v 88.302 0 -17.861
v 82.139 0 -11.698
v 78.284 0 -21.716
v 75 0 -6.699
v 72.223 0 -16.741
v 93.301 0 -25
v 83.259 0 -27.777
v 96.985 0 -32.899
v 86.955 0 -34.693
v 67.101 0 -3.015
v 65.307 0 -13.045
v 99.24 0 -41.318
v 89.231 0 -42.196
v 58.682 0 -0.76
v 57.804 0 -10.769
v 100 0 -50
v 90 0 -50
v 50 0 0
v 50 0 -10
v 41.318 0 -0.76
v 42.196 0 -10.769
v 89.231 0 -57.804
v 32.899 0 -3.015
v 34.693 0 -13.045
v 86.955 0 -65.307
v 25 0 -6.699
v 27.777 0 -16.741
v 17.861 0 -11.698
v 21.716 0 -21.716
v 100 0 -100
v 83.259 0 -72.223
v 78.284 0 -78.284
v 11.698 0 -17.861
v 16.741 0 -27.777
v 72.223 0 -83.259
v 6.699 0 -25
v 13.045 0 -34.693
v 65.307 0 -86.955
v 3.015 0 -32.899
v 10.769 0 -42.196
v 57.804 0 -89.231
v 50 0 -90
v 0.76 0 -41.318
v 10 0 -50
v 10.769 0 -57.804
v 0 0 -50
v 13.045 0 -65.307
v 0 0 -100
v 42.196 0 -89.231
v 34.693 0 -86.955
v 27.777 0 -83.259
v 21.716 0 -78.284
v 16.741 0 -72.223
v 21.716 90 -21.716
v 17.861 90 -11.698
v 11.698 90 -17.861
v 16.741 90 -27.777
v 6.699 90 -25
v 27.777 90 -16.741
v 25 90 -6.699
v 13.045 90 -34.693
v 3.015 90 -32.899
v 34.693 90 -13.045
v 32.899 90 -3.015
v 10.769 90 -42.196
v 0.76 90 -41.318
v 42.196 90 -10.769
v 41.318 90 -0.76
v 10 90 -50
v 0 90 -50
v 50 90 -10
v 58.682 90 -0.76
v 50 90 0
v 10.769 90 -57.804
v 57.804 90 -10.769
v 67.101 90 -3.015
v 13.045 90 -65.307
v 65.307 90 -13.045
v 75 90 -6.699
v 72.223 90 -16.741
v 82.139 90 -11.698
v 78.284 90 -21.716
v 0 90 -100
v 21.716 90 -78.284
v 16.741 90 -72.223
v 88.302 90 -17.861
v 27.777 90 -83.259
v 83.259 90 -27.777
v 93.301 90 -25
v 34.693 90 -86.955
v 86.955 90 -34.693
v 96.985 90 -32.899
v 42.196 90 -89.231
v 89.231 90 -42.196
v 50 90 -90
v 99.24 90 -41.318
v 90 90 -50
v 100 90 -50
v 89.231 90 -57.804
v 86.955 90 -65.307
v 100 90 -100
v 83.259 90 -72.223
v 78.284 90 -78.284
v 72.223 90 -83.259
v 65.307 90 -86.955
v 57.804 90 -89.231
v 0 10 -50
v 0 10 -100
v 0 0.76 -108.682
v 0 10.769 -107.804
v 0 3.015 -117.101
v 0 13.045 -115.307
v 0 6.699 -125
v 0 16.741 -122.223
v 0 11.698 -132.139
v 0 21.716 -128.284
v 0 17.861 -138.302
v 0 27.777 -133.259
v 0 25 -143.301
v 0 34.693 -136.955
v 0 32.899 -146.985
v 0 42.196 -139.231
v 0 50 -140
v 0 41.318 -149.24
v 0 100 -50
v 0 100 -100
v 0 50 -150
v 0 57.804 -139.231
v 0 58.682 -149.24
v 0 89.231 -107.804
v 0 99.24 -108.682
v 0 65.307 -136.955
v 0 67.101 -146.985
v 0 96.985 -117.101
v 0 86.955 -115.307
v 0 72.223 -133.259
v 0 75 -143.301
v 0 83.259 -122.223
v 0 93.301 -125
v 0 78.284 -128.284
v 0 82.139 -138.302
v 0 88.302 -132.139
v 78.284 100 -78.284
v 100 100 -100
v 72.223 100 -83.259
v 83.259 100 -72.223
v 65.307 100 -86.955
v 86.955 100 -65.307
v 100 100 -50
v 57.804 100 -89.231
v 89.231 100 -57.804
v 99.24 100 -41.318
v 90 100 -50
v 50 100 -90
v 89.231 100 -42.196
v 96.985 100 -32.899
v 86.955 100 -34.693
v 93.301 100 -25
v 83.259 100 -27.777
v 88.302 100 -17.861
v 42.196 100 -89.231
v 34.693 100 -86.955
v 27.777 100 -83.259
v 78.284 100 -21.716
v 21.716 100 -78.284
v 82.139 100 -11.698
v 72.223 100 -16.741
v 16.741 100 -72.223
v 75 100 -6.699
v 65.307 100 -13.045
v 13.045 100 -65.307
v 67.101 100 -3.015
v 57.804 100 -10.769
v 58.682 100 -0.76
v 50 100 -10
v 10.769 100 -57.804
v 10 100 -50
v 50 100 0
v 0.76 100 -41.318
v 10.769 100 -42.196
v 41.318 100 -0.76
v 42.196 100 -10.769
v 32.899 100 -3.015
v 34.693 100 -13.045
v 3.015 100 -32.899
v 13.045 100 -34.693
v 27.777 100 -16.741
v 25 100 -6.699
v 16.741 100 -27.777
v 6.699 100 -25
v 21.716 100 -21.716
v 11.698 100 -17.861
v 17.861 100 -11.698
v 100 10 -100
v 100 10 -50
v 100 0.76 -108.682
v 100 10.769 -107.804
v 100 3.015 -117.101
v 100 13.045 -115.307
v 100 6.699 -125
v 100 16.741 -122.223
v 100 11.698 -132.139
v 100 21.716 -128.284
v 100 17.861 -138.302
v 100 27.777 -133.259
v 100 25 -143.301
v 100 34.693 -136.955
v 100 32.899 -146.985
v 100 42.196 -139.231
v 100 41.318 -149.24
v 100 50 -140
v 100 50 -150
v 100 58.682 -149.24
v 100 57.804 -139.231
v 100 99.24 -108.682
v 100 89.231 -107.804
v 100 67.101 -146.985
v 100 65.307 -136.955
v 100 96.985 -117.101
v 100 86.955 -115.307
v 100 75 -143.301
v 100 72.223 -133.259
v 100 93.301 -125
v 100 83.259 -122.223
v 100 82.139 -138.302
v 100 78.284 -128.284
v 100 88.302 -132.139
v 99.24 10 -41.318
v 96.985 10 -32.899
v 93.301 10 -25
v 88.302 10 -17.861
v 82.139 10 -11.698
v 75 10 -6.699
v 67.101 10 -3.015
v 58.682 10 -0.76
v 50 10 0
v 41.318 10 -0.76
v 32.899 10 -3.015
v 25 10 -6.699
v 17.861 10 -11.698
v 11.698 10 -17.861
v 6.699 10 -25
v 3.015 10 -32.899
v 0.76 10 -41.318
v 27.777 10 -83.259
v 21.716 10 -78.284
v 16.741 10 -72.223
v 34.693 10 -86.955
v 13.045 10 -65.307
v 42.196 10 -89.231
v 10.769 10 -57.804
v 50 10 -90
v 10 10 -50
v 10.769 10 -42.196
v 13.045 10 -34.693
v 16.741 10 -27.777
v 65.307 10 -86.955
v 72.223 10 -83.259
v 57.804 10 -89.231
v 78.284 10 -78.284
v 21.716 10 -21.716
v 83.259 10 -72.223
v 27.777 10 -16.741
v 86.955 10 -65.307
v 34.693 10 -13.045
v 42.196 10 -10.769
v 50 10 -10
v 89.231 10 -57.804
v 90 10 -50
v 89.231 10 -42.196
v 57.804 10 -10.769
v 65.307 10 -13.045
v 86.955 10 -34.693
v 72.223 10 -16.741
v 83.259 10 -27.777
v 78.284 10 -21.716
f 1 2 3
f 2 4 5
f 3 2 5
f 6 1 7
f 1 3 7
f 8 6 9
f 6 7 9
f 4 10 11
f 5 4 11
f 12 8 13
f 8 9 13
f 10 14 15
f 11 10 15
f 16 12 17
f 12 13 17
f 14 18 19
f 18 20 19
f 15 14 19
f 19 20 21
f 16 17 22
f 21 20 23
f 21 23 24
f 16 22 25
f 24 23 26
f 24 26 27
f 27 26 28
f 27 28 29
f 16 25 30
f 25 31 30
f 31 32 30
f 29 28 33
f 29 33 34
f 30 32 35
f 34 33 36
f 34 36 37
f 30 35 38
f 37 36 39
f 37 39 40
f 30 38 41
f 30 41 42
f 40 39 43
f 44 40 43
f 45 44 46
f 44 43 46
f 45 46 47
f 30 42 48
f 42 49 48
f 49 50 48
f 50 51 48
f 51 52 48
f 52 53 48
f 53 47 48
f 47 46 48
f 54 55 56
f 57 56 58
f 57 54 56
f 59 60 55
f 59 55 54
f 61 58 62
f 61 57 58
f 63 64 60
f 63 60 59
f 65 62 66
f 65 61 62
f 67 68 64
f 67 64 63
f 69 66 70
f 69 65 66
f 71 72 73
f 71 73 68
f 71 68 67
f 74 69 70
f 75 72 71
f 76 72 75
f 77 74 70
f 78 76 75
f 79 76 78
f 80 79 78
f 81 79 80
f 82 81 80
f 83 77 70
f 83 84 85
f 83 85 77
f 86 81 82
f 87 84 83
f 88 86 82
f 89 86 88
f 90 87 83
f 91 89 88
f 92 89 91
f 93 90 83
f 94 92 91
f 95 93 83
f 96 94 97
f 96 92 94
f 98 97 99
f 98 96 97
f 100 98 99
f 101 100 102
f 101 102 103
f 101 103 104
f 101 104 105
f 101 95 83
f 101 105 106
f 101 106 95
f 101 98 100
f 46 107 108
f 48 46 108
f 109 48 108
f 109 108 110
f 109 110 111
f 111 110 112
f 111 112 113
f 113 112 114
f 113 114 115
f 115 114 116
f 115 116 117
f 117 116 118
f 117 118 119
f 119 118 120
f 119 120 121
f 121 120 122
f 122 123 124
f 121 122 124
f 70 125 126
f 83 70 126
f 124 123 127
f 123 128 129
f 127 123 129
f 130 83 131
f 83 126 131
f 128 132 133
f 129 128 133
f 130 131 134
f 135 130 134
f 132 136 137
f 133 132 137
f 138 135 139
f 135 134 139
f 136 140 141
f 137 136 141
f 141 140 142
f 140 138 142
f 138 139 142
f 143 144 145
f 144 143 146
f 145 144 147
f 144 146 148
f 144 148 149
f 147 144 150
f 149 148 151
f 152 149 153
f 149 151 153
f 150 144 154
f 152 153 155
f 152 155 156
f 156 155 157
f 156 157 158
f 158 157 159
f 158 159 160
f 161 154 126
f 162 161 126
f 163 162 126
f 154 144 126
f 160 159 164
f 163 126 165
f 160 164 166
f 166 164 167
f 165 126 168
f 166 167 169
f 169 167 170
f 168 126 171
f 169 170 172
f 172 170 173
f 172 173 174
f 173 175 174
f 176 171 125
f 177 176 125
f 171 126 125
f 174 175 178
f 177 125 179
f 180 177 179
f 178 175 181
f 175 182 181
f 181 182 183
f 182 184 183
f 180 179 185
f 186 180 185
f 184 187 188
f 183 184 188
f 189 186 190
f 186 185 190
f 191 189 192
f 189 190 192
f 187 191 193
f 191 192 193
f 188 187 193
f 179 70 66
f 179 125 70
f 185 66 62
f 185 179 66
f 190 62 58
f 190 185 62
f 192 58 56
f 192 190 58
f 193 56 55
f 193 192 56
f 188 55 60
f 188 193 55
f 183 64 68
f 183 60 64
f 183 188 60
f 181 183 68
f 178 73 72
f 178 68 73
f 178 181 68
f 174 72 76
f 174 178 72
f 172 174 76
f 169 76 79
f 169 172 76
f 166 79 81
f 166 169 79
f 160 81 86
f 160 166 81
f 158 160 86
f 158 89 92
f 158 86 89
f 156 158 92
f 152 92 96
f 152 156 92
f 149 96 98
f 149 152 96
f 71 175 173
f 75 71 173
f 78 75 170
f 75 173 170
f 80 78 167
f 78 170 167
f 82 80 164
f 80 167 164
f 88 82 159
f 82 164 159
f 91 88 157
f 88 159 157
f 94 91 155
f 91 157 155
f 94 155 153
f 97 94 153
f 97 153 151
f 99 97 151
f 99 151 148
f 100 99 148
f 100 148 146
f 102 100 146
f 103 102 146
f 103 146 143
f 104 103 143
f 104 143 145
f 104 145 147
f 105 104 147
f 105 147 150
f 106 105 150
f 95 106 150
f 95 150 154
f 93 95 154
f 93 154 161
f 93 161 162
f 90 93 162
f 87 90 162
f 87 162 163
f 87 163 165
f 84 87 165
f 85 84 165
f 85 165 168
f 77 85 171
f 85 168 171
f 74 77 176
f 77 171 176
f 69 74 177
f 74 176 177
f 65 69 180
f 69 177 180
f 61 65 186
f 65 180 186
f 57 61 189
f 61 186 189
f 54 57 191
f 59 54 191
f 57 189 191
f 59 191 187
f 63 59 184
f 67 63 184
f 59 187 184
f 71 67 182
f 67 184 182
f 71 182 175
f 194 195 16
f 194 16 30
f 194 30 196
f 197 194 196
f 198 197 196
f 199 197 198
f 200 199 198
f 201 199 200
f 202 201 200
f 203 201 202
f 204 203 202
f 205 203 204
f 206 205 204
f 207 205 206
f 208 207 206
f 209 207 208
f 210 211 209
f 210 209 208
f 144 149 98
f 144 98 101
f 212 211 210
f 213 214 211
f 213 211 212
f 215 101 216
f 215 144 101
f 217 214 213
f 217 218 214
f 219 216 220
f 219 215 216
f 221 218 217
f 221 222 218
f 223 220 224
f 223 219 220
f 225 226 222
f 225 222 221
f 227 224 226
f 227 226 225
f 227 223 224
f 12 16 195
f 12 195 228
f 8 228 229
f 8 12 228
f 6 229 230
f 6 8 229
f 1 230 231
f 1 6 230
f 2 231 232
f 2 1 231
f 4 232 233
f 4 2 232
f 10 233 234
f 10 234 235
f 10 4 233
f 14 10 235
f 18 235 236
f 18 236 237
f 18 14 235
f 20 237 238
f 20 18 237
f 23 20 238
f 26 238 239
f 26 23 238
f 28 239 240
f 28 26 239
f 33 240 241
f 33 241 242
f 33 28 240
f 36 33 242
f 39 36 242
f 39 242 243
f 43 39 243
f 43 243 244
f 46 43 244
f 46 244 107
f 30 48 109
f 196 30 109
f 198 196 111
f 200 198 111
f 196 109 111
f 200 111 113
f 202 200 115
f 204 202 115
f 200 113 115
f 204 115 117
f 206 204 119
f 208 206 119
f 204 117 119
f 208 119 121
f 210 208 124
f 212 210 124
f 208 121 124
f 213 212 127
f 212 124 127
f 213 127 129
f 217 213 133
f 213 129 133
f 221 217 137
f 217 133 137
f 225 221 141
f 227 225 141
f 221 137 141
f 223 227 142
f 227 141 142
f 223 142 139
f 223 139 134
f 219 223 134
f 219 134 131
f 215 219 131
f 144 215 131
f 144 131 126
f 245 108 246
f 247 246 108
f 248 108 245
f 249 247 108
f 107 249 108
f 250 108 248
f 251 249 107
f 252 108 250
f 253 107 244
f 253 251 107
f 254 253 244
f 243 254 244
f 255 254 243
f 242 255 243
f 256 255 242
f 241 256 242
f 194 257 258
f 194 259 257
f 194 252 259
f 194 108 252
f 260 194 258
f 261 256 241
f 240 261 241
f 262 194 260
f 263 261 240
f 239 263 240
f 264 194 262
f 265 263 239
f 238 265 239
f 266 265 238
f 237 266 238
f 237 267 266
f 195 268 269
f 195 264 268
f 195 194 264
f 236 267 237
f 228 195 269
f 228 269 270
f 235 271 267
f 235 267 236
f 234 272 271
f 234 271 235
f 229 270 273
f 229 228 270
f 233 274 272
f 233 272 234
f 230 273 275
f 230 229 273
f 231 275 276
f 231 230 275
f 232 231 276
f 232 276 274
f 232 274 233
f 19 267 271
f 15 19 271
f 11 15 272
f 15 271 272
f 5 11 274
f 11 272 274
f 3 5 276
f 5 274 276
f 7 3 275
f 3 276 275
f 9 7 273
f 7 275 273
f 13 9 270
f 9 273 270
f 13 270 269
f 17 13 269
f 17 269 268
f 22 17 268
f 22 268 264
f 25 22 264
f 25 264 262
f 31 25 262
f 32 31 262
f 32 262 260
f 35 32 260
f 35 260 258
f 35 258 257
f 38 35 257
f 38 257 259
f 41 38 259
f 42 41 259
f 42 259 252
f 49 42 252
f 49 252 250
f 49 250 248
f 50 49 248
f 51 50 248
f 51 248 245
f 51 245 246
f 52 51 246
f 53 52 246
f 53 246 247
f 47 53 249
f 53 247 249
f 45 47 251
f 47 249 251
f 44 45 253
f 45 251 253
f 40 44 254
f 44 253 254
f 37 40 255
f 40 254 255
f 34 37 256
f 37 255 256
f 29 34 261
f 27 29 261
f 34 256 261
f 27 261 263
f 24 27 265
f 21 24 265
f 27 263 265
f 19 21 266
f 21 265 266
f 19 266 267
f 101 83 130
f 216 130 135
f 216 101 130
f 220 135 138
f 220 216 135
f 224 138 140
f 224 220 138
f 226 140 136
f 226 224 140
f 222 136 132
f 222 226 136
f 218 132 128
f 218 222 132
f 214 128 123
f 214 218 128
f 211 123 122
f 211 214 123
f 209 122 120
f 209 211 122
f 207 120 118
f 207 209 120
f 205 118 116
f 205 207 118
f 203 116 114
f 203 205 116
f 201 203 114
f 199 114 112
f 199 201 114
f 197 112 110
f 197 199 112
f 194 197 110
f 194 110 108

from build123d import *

# Parameters (mm, degrees)
EXTRUDE_1_DEPTH     = 100
CUT_EXTRUDE_1_DEPTH = 207.155281281
FILLET_1_RADIUS     = 50
FILLET_1_LENGTH     = 10
FILLET_2_RADIUS     = 50
FILLET_2_LENGTH     = 10
SKETCH_3_R          = 40
CUT_EXTRUDE_2_DEPTH = 207.155281281


with BuildPart() as part:
    # 草圖1 → 填料-伸長1 (new body)
    with BuildSketch(Plane(origin=(0, 0, 0), x_dir=(0, 0, -1), z_dir=(1, 0, 0))):
        with BuildLine():
            Line((0, 0), (100, 0))
            ThreePointArc((100, 0), (150, 50), (100, 100))
            Line((100, 100), (0, 100))
            Line((0, 100), (0, 0))
        make_face()
    extrude(amount=EXTRUDE_1_DEPTH)

    # 草圖2 → 除料-伸長1 (cut, through all)
    with BuildSketch(Plane(origin=(100, 0, 0), x_dir=(0, 0, -1), z_dir=(1, 0, 0))):
        with BuildLine():
            Line((-26.438322174, 10), (-26.438322174, 90))
            Line((-26.438322174, 90), (100, 90))
            ThreePointArc((100, 90), (140, 50), (100, 10))
            Line((100, 10), (-26.438322174, 10))
        make_face()
    extrude(amount=-CUT_EXTRUDE_1_DEPTH, mode=Mode.SUBTRACT)

    # 圓角1: full round fillet: the end face becomes a half cylinder, R = half its width
    fillet_1_face = Plane((50, 95, 0), x_dir=(0, 1, 0), z_dir=(0, 0, 1))  # on the end face: x along it, z out of the body
    fillet_1_slab = fillet_1_face.offset(-FILLET_1_RADIUS / 2) * Box(FILLET_1_LENGTH, 2 * FILLET_1_RADIUS, FILLET_1_RADIUS, mode=Mode.PRIVATE)  # the body's end, R deep
    fillet_1_round = Plane((50, 95, -50), x_dir=(0, 0, 1), z_dir=(0, 1, 0)) * Cylinder(FILLET_1_RADIUS, FILLET_1_LENGTH, mode=Mode.PRIVATE)  # its axis R under the face
    add(fillet_1_slab - fillet_1_round, mode=Mode.SUBTRACT)

    # 圓角2: full round fillet: the end face becomes a half cylinder, R = half its width
    fillet_2_face = Plane((50, 5, 0), x_dir=(0, -1, 0), z_dir=(0, 0, 1))  # on the end face: x along it, z out of the body
    fillet_2_slab = fillet_2_face.offset(-FILLET_2_RADIUS / 2) * Box(FILLET_2_LENGTH, 2 * FILLET_2_RADIUS, FILLET_2_RADIUS, mode=Mode.PRIVATE)  # the body's end, R deep
    fillet_2_round = Plane((50, 5, -50), x_dir=(0, 0, 1), z_dir=(0, -1, 0)) * Cylinder(FILLET_2_RADIUS, FILLET_2_LENGTH, mode=Mode.PRIVATE)  # its axis R under the face
    add(fillet_2_slab - fillet_2_round, mode=Mode.SUBTRACT)

    # 草圖3 → 除料-伸長2 (cut, through all)
    with BuildSketch(Plane(origin=(0, 100, 0), x_dir=(1, 0, 0), z_dir=(0, 1, 0))):
        with Locations(Location((50, 50, 0), (0, 0, 270))):
            Circle(SKETCH_3_R)
    extrude(amount=-CUT_EXTRUDE_2_DEPTH, mode=Mode.SUBTRACT)


solid = part.part
